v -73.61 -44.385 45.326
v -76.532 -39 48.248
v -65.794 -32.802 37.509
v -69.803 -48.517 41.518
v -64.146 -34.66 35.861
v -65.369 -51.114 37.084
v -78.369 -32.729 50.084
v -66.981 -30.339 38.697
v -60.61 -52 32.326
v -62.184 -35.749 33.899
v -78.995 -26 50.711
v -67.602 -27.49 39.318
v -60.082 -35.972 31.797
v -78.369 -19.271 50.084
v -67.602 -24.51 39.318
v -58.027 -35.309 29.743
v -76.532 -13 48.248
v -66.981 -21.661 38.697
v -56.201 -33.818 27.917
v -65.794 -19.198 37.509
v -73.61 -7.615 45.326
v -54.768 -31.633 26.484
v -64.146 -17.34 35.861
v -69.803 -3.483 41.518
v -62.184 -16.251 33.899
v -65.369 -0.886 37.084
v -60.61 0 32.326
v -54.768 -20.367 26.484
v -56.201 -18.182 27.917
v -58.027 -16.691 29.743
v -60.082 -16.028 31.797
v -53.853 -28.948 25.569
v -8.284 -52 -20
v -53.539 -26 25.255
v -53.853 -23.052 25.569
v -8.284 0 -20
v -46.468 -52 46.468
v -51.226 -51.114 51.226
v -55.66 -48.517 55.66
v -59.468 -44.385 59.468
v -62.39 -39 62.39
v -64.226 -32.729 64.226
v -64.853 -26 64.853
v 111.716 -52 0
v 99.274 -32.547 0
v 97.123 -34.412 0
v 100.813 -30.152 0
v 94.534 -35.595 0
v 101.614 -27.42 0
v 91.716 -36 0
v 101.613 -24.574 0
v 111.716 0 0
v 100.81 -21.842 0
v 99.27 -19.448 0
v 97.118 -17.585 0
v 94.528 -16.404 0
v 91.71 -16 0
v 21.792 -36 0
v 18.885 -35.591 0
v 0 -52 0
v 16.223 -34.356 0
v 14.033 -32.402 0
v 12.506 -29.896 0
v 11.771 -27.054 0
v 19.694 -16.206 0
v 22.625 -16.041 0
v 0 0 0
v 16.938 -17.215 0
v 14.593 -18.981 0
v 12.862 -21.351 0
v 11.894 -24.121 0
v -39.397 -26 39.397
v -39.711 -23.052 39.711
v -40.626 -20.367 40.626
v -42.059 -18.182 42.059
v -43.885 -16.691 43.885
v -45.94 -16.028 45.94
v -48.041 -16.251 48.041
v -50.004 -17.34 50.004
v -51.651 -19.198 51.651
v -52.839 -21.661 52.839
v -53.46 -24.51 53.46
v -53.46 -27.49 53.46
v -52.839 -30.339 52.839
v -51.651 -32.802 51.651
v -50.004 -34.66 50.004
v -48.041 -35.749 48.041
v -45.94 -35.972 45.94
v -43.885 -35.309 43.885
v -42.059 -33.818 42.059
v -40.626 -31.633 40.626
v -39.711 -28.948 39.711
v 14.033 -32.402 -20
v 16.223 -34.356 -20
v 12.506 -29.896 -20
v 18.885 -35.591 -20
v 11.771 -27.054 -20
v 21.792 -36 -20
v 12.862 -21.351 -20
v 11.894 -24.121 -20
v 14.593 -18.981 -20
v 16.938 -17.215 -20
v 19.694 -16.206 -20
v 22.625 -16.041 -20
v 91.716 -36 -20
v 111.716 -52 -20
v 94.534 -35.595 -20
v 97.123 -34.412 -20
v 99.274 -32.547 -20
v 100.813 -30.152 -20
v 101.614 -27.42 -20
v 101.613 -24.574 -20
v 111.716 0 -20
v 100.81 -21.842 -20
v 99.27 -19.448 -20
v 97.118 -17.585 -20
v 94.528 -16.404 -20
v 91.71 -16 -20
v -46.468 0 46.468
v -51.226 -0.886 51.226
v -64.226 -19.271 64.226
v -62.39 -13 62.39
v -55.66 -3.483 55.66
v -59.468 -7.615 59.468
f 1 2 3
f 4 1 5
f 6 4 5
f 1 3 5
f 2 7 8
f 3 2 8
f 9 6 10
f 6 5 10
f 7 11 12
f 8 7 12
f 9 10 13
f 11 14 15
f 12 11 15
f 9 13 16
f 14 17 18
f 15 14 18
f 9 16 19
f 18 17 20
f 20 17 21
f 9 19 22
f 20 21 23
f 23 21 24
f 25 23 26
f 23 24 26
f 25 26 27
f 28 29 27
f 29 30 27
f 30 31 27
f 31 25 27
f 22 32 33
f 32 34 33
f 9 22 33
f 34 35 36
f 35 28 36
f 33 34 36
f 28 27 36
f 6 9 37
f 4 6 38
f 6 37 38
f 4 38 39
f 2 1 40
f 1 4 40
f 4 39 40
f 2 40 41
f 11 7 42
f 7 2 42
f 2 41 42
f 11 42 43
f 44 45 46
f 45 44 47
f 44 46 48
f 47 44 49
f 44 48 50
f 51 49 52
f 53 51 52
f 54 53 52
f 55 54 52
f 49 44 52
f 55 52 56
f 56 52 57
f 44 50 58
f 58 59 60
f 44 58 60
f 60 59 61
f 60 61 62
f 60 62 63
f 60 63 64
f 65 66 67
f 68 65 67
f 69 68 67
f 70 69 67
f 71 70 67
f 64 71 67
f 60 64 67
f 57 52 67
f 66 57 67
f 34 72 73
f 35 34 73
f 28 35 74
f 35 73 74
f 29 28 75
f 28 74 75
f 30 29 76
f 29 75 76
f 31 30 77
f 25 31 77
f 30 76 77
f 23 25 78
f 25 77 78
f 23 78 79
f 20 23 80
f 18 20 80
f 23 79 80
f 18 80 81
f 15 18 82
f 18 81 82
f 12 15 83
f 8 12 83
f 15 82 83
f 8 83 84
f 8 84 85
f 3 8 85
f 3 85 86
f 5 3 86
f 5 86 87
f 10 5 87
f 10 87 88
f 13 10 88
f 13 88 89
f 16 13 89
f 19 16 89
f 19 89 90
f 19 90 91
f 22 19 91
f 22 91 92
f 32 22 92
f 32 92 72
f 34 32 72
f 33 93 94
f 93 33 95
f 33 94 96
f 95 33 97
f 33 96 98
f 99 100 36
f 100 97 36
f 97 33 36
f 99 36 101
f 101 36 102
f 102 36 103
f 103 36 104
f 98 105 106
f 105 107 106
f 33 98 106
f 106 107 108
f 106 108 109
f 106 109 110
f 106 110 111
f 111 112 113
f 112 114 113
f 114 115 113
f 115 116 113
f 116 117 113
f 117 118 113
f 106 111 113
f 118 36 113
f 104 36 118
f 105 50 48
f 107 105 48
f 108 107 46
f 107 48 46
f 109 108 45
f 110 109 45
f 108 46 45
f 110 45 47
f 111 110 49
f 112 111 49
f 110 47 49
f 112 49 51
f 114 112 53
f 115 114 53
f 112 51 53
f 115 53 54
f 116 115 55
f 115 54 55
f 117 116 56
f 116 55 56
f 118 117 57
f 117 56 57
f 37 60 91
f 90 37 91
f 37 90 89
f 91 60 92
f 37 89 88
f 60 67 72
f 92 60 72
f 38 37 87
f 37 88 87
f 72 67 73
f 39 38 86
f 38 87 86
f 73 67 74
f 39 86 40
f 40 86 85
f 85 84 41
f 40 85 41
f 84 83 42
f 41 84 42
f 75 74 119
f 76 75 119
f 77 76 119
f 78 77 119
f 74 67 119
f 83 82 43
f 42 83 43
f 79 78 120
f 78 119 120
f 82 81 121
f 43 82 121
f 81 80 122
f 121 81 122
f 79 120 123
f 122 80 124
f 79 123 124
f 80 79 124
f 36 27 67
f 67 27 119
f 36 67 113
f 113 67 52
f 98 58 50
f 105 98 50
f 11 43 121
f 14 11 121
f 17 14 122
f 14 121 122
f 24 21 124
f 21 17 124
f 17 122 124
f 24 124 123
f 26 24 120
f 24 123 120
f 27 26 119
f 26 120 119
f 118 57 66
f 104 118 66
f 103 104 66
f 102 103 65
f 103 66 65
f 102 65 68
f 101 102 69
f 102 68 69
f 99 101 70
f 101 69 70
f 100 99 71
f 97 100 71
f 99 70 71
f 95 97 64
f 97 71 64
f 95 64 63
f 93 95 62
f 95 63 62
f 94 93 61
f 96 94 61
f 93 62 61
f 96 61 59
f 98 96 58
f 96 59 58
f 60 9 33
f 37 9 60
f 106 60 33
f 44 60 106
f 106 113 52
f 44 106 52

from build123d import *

# Parameters (mm, degrees)
F1_DEPTH = 52
F3_DEPTH = 20
F4_R     = 10
F5_DEPTH = 25


with BuildPart() as f1:
    # F0 (on Front) → F1 (new body)
    with BuildSketch(Plane.XZ):
        Polygon((0, 0), (-64.8528137424, 64.8528137424), (-78.9949493661, 50.7106781187), (-8.2842712475, -20), (111.7157287525, -20), (111.7157287525, 0), align=None)
    extrude(amount=F1_DEPTH)

    # F2 (on face) → F3 (cut, through all)
    with BuildSketch(Plane.XY):
        with BuildLine():
            Line((21.7918254922, -35.9997104601), (91.7156873447, -36))
            ThreePointArc((91.7156873447, -36), (101.7157283101, -25.9970253962), (91.7097381372, -16.0000017944))
            Line((91.7097381372, -16.0000017944), (22.6246005983, -16.0413880501))
            ThreePointArc((22.6246005983, -16.0413880501), (11.724422575, -25.5831056894), (21.7918254922, -35.9997104601))
        make_face()
    extrude(amount=-F3_DEPTH, mode=Mode.SUBTRACT)

    # F4 (on face) → F5 (cut)
    with BuildSketch(Plane(origin=(0, 0, 0), x_dir=(0.7071067812, 0, -0.7071067812), z_dir=(0.7071067812, 0, 0.7071067812))):
        with BuildLine():
            ThreePointArc((-65.7157287525, -52), (-84.1005050634, -44.3847763109), (-91.7157287525, -26))
            Line((-91.7157287525, -26), (-91.7157287525, -52))
            Line((-91.7157287525, -52), (-65.7157287525, -52))
        make_face()
        with Locations((-65.7157287525, -26)):
            Circle(F4_R)
        with BuildLine():
            ThreePointArc((-91.7157287525, -26), (-84.1005050634, -7.6152236891), (-65.7157287525, 0))
            Line((-65.7157287525, 0), (-91.7157287525, 0))
            Line((-91.7157287525, 0), (-91.7157287525, -26))
        make_face()
    extrude(amount=-F5_DEPTH, mode=Mode.SUBTRACT)


solid = f1.part
